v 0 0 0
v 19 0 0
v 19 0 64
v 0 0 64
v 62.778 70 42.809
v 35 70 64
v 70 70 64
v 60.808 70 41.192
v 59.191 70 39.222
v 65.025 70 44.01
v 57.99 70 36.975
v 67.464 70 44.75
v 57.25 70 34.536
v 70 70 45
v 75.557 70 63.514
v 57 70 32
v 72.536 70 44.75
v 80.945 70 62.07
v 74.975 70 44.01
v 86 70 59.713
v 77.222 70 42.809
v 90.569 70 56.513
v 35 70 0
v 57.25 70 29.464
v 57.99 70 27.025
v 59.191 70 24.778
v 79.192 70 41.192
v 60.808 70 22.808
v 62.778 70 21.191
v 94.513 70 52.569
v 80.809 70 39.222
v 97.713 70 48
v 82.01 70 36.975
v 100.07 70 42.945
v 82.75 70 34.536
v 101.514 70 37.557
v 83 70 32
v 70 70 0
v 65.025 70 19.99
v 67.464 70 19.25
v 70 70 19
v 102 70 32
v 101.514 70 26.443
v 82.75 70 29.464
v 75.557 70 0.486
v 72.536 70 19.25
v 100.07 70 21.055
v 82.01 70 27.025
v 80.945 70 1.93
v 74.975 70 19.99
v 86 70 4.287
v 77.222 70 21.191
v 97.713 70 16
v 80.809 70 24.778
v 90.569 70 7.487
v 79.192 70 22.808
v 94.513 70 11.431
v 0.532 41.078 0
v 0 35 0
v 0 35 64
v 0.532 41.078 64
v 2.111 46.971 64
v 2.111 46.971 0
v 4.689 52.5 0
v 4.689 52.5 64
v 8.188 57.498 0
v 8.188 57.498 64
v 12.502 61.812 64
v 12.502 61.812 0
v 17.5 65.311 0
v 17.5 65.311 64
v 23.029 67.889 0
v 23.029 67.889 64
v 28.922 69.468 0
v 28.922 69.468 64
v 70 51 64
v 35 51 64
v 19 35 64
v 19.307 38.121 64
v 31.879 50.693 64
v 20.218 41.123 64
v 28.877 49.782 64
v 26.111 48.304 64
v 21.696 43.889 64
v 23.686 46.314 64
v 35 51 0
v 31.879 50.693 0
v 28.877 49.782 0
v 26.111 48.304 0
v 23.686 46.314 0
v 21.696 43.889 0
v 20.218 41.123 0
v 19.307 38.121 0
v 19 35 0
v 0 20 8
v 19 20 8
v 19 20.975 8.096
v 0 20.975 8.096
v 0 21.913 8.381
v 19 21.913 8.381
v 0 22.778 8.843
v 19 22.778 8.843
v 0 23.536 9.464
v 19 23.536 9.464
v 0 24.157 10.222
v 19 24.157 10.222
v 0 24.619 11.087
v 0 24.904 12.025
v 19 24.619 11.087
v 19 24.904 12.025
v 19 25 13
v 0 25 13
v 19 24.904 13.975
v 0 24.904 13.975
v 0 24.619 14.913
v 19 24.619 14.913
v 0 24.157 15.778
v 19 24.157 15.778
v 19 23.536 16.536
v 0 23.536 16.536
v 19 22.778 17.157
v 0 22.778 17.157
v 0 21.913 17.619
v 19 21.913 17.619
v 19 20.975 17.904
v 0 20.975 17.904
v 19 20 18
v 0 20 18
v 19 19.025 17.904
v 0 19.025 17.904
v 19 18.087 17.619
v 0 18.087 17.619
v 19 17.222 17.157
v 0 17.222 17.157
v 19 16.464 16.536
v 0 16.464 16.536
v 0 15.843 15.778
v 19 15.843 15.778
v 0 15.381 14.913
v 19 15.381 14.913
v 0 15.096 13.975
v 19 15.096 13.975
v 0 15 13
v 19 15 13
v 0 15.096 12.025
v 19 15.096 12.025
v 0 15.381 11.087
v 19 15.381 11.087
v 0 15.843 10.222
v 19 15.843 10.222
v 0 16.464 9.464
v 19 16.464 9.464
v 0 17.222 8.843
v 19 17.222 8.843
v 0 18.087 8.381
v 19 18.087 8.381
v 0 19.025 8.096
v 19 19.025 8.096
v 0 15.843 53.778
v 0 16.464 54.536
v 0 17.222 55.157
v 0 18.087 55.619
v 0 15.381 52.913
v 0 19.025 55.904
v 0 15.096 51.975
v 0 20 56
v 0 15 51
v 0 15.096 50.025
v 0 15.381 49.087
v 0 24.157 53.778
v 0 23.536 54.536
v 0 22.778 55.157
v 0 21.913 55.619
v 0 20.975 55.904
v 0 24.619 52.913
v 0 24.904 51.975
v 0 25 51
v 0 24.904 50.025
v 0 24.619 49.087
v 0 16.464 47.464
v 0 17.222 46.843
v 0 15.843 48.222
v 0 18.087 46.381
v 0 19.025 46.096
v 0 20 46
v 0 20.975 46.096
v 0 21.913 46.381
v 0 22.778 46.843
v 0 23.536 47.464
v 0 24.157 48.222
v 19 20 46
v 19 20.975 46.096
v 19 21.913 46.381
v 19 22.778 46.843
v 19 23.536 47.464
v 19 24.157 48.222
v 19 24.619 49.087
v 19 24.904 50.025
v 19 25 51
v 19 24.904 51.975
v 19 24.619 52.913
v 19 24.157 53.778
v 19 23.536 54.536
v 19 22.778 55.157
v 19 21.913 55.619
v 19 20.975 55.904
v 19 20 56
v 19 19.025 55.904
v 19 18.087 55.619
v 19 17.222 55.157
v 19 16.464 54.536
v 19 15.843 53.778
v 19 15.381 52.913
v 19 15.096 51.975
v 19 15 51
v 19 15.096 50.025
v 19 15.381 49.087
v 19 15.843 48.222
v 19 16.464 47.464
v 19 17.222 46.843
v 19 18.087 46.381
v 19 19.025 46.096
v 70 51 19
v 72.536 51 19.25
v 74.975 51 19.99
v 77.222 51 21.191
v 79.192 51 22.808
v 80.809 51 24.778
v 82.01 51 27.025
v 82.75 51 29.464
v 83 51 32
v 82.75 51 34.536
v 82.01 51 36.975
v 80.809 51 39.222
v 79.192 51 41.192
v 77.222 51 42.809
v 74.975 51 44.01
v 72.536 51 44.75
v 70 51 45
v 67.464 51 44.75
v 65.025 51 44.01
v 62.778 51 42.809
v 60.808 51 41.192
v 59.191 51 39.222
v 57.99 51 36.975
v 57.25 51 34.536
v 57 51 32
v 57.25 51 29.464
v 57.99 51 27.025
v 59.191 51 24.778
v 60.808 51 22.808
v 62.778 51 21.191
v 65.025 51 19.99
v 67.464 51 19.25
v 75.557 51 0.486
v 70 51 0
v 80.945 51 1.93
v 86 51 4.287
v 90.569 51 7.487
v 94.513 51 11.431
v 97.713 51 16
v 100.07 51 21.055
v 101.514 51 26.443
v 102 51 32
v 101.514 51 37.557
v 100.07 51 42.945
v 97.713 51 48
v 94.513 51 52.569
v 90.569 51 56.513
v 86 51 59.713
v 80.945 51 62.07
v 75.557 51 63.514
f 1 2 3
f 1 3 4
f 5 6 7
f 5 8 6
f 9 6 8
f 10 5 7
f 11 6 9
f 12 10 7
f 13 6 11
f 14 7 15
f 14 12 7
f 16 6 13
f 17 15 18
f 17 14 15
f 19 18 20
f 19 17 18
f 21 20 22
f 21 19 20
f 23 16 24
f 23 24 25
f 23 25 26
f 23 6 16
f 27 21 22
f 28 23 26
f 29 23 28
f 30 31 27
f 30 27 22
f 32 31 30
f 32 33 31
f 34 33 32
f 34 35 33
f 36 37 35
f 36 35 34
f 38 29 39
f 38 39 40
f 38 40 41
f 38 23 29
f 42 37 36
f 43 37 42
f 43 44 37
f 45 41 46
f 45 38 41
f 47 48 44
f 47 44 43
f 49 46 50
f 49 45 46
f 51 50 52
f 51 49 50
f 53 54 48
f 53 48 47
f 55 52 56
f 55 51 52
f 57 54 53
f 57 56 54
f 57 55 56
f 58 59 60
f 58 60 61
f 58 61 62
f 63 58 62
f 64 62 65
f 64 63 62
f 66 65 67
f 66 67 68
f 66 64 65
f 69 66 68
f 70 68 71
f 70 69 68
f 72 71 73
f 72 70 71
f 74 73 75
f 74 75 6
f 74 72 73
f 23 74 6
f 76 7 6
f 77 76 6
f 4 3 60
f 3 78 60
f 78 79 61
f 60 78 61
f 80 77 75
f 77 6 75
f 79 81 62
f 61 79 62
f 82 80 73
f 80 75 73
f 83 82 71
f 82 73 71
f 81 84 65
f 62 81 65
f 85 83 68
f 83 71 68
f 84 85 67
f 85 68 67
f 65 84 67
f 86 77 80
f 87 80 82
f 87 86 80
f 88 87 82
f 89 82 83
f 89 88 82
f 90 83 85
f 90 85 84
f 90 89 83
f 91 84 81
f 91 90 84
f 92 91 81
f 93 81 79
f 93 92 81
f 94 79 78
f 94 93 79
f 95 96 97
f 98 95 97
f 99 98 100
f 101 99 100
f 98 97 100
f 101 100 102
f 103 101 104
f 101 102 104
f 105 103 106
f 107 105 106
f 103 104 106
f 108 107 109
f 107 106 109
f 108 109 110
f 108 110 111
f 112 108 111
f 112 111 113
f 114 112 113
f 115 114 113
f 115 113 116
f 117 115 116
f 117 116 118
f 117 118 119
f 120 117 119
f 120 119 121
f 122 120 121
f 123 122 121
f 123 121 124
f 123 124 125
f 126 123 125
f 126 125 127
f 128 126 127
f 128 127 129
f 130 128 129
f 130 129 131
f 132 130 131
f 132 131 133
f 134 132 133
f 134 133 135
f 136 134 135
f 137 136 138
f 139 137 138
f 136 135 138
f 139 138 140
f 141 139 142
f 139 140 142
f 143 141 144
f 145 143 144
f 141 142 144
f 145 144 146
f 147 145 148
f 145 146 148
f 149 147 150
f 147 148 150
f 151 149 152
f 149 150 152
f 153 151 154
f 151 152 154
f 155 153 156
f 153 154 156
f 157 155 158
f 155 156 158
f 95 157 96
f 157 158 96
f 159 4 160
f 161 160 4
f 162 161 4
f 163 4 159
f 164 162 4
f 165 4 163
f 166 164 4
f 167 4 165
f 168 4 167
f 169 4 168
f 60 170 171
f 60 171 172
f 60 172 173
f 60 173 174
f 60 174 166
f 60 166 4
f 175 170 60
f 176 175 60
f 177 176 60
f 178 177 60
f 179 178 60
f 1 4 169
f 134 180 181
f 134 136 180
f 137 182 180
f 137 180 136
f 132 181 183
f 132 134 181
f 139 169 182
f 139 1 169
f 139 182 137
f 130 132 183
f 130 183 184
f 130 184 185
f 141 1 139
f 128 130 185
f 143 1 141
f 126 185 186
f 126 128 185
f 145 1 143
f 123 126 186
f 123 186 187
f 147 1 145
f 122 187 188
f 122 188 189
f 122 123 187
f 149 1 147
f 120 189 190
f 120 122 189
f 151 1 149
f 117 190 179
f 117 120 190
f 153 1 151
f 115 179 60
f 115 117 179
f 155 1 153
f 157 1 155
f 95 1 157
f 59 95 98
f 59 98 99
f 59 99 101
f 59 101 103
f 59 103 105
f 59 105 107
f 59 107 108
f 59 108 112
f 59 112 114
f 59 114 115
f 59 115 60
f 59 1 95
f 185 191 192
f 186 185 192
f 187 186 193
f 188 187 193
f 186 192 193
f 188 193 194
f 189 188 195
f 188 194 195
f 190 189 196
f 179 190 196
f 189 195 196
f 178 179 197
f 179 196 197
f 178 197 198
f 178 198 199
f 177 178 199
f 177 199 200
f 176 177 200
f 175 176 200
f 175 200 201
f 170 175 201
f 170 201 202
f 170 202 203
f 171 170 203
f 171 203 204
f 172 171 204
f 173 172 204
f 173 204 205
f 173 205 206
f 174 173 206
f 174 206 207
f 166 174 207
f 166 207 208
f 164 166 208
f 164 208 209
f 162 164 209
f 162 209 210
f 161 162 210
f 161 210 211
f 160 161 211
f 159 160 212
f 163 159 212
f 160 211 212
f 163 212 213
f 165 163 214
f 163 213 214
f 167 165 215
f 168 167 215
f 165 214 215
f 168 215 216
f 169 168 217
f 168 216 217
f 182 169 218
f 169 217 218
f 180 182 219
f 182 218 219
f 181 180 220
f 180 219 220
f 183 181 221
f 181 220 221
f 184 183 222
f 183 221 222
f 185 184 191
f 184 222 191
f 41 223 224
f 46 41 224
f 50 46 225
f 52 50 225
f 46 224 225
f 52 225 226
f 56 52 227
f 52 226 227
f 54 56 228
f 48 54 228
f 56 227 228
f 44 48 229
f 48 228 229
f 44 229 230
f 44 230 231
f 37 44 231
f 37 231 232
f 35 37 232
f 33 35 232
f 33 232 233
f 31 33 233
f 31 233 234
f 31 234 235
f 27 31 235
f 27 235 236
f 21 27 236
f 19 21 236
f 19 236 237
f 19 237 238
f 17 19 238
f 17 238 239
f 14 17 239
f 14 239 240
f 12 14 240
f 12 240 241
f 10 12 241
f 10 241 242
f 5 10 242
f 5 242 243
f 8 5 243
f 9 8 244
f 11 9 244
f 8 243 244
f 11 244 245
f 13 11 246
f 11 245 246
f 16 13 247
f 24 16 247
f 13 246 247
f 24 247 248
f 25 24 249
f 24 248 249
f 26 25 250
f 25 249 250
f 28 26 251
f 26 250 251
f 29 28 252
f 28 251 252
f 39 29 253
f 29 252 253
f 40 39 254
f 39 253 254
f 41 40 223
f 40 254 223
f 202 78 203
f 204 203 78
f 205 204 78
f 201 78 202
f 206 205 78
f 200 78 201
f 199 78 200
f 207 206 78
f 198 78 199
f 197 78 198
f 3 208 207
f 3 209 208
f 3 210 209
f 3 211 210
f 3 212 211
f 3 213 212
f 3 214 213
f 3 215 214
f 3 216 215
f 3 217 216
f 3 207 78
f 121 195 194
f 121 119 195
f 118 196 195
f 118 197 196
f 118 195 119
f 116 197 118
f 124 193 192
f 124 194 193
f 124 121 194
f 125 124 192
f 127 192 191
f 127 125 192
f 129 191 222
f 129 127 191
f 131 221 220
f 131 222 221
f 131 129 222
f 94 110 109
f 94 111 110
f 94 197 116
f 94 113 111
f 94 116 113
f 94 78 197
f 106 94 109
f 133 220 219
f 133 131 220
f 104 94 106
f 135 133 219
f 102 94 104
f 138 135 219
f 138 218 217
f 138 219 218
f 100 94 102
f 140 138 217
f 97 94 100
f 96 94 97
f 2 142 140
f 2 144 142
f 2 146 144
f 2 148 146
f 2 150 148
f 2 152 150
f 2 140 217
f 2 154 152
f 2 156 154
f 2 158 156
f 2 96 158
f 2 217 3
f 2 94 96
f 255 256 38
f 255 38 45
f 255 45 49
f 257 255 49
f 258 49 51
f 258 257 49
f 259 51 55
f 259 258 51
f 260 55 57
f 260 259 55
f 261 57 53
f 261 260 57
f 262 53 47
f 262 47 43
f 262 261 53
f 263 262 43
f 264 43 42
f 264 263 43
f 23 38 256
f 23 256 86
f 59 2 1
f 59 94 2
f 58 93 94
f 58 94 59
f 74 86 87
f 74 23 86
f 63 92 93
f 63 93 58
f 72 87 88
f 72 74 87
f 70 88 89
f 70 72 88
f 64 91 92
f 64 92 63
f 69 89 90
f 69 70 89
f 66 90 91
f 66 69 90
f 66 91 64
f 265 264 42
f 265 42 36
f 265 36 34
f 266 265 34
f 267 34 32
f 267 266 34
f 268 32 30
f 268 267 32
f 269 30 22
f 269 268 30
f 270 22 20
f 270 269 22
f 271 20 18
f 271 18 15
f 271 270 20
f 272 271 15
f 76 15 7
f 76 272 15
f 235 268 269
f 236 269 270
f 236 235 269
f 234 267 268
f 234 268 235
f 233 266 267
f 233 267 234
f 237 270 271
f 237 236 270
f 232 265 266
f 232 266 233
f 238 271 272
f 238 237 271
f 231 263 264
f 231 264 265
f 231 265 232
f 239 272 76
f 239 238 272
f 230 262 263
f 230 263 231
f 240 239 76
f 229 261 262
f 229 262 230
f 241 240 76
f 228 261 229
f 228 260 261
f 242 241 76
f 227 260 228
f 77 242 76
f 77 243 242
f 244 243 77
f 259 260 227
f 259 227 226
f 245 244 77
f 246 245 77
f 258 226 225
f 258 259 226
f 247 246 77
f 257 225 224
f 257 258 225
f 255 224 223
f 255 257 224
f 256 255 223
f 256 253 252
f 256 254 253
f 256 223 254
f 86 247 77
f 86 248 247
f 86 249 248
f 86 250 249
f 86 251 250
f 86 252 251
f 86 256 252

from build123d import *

# Parameters (mm, degrees)
BASE_FLANGE1_DEPTH         = 64
BREAK_CORNER1_START        = 51
BREAK_CORNER1_DEPTH        = 19
F_9_0_9_DIAMETER_HOLE1_D   = 26
F_10_0_10_DIAMETER_HOLE1_D = 10


# Read off the part's stored shape, not the designer's step: Break-Corner1
# Sheet-metal steps are written as plain solids
with BuildPart() as part:
    # Sketch1 → Base-Flange1 (new body)
    with BuildSketch(Plane.XY):
        with BuildLine():
            Line((0, 0), (0, 35))
            ThreePointArc((0, 35), (10.251262658, 59.748737342), (35, 70))
            Line((35, 70), (102, 70))
            Line((102, 70), (102, 51))
            Line((102, 51), (35, 51))
            ThreePointArc((35, 51), (23.686291501, 46.313708499), (19, 35))
            Line((19, 35), (19, 0))
            Line((19, 0), (0, 0))
        make_face()
    extrude(amount=BASE_FLANGE1_DEPTH)

    # Break-Corner1 outline → Break-Corner1 (cut)
    with BuildSketch(Plane(origin=(0, 0, 0), x_dir=(1, 0, 0), z_dir=(0, 1, 0)).offset(BREAK_CORNER1_START)):
        with BuildLine():
            Line((102, -64), (102, -32))
            ThreePointArc((102, -32), (92.627416998, -54.627416998), (70, -64))
            Line((70, -64), (102, -64))
        make_face()
        with BuildLine():
            ThreePointArc((70, 0), (92.627416998, -9.372583002), (102, -32))
            Line((102, -32), (102, 0))
            Line((102, 0), (70, 0))
        make_face()
    extrude(amount=BREAK_CORNER1_DEPTH, mode=Mode.SUBTRACT)

    # Ø9.0 (9) Diameter Hole1 (through all)
    with Locations(Plane(origin=(70, 70, 32), x_dir=(0, 0, 1), z_dir=(0, 1, 0))):
        with Locations((0, 0)):
            Hole(F_9_0_9_DIAMETER_HOLE1_D / 2)

    # Ø10.0 (10) Diameter Hole1 (through all)
    with Locations(Plane.ZY):
        with Locations((13, 20), (51, 20)):
            Hole(F_10_0_10_DIAMETER_HOLE1_D / 2)


solid = part.part
